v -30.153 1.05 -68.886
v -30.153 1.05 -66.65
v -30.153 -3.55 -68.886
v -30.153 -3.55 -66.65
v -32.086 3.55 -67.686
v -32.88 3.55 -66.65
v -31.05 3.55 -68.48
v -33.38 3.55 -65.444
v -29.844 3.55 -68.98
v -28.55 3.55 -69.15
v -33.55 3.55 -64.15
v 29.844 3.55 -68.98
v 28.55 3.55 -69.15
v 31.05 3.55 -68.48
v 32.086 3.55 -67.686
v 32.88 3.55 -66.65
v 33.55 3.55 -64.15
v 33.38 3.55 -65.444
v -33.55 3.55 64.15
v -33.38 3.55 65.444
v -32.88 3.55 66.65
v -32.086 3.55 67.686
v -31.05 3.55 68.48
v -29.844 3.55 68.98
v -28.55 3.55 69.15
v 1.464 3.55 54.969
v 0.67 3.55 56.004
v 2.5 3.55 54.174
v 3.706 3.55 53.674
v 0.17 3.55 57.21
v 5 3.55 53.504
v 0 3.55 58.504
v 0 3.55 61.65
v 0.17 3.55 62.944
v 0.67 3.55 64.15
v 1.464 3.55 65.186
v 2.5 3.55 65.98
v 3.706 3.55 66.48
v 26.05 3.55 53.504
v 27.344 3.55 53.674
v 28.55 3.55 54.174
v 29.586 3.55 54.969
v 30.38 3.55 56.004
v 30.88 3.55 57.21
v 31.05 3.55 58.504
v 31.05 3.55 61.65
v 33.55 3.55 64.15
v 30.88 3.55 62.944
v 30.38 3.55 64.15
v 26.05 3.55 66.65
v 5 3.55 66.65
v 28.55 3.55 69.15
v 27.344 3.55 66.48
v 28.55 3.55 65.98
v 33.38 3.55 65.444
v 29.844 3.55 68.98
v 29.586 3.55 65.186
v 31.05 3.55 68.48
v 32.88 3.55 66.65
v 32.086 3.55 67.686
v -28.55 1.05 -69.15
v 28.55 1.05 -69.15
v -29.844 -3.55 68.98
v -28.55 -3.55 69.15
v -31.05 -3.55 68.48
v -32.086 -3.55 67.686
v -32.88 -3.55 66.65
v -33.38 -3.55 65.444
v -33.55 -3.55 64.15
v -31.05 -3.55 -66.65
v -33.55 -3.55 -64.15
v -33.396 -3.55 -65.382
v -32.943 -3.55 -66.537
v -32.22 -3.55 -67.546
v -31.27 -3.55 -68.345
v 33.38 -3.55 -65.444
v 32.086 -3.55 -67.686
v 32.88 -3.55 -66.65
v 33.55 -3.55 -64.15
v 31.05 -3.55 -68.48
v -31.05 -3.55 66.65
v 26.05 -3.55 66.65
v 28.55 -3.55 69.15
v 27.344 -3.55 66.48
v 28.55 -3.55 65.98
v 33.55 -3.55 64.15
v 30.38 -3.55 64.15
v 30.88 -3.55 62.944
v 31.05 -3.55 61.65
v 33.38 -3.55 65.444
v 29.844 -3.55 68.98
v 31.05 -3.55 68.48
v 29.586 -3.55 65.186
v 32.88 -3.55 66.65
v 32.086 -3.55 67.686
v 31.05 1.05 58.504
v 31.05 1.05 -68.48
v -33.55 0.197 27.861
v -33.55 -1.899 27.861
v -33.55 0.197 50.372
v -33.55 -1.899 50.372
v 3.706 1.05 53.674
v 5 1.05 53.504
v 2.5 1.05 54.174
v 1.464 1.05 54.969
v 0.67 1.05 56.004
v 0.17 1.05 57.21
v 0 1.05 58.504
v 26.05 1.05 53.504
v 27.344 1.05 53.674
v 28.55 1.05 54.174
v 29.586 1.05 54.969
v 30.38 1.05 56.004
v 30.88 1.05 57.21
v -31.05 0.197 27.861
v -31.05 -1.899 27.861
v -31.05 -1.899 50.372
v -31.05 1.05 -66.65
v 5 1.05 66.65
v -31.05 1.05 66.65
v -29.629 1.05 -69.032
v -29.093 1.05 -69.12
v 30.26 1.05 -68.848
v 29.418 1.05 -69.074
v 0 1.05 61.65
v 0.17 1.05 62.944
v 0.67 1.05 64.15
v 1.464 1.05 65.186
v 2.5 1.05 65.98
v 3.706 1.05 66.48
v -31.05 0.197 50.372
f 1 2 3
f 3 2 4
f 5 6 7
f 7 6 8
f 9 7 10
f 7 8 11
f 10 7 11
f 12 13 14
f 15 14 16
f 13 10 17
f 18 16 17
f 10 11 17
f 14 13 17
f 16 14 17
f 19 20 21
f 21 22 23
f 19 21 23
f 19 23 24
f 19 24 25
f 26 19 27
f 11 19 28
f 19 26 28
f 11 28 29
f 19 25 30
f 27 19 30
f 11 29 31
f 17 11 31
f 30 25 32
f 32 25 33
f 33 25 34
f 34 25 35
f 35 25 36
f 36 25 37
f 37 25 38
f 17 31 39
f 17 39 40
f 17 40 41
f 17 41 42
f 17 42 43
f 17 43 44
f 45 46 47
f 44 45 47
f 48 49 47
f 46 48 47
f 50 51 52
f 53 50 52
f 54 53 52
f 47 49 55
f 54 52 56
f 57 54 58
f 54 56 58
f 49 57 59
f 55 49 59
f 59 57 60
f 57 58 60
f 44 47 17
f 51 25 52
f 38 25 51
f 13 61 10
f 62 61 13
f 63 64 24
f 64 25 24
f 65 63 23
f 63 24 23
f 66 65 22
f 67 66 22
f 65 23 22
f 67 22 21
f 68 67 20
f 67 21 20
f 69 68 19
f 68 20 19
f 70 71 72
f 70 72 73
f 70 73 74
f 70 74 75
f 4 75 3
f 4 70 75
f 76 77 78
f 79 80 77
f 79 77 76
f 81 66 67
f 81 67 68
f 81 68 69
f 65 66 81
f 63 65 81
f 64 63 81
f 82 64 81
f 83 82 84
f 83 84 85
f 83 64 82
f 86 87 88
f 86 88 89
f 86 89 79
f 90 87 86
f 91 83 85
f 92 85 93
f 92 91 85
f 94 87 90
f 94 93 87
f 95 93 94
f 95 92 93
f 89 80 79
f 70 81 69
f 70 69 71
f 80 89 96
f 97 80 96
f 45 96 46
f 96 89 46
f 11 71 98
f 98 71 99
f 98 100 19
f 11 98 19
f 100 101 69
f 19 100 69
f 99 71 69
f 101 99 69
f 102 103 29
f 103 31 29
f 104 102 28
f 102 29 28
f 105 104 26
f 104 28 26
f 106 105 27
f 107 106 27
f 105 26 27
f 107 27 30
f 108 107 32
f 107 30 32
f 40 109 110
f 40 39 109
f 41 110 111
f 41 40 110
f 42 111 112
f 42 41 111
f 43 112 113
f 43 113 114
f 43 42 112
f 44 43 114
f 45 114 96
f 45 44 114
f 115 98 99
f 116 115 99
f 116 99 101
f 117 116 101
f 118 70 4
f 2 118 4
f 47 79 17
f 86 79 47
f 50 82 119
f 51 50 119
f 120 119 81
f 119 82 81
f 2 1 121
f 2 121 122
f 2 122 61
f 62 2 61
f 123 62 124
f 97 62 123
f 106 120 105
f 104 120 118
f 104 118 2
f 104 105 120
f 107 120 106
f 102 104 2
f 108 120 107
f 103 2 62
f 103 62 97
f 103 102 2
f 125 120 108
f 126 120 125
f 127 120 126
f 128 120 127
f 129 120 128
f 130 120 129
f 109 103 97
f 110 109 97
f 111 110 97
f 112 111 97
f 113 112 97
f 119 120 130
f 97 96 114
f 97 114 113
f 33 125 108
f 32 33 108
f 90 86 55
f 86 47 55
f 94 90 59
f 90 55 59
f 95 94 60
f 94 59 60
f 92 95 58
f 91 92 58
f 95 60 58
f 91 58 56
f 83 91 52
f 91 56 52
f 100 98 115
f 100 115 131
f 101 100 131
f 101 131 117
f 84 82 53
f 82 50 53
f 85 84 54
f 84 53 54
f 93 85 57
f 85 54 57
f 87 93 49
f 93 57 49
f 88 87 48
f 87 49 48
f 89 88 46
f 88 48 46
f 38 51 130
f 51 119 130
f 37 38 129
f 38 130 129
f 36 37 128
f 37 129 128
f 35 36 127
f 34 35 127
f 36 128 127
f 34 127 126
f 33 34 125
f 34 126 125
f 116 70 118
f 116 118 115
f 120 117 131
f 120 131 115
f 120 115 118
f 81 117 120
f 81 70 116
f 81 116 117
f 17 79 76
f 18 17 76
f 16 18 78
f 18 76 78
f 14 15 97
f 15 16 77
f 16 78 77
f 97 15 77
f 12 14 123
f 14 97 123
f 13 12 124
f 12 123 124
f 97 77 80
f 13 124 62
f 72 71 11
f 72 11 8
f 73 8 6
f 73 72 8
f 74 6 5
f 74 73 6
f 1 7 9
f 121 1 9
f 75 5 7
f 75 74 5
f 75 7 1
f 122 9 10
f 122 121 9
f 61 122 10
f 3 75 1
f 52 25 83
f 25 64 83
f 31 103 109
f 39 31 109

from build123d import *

# Parameters (mm, degrees)
F0_W      = 67.1
F0_H      = 138.3
F1_DEPTH  = 3.55
F2_T      = -2.5
F3_R      = 5
F4_W      = 15.2049176395
F4_H      = 6.8852454424
F5_DEPTH  = 12.5
F7_R      = 5
F8_DEPTH  = 25
F9_W      = 2.0960036782
F9_H      = 22.5108209997
F10_DEPTH = 12.5


with BuildPart() as f1:
    # F0 (on Front) → F1 (new body, symmetric)
    with BuildSketch(Plane.XZ):
        Rectangle(F0_W, F0_H)
    extrude(amount=F1_DEPTH, both=True)

    # F2
    f2_openings = [f1.faces().sort_by_distance(p)[0] for p in [
        (0, -3.55, 0),
    ]]
    offset(amount=F2_T, openings=f2_openings)

    # F3
    f3_edges = [f1.edges().sort_by_distance(p)[0] for p in [
        (-33.55, 0, 69.15),
        (33.55, 0, 69.15),
        (33.55, 0, -69.15),
        (-33.55, 0, -69.15),
    ]]
    fillet(f3_edges, radius=F3_R)

    # F4 (on face) → F5 (cut, symmetric)
    with BuildSketch(Plane.XZ.offset(-1.05)):
        Polygon((12.9098352045, 53.504101932), (12.9098352045, 60.3893473744), (28.114752844, 60.3893473744), (28.114752844, 53.504101932), (31.05, 53.504101932), (31.05, 66.65), (0, 66.65), (0, 53.504101932), align=None)
        with Locations((20.5122940242, 56.9467246532)):
            Rectangle(F4_W, F4_H)
    extrude(amount=F5_DEPTH, both=True, mode=Mode.SUBTRACT)

    # F7
    f7_edges = [f1.edges().sort_by_distance(p)[0] for p in [
        (0, 2.3, 53.504102),
        (0, 2.3, 66.65),
        (31.05, 0, 66.65),
        (31.05, 2.3, 53.504102),
    ]]
    fillet(f7_edges, radius=F7_R)

    # F6 (on face) → F8 (cut)
    with BuildSketch(Plane.XY.offset(-66.65)):
        Polygon((5.7946089791, 1.05), (-30.1529895514, 1.05), (-30.1529895514, -3.55), (31.05, -3.55), (31.05, 1.05), align=None)
    extrude(amount=-F8_DEPTH, mode=Mode.SUBTRACT)

    # F9 (on face) → F10 (cut, symmetric)
    with BuildSketch(Plane(origin=(-33.55, 0, 0), x_dir=(0, -1, 0), z_dir=(-1, 0, 0))):
        with Locations((0.850938115, 39.116631262)):
            Rectangle(F9_W, F9_H)
    extrude(amount=F10_DEPTH, both=True, mode=Mode.SUBTRACT)


solid = f1.part
